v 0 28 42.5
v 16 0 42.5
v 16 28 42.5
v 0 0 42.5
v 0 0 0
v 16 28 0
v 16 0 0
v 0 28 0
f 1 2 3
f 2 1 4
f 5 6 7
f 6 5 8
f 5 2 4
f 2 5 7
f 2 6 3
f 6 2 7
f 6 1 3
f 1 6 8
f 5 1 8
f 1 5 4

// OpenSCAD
$fn = 64;

block_x = 16.0;
block_y = 28.0;
block_z = 42.5;

module leadscrew_nut_housing() {
    cube([block_x, block_y, block_z], center=false);
}

leadscrew_nut_housing();
